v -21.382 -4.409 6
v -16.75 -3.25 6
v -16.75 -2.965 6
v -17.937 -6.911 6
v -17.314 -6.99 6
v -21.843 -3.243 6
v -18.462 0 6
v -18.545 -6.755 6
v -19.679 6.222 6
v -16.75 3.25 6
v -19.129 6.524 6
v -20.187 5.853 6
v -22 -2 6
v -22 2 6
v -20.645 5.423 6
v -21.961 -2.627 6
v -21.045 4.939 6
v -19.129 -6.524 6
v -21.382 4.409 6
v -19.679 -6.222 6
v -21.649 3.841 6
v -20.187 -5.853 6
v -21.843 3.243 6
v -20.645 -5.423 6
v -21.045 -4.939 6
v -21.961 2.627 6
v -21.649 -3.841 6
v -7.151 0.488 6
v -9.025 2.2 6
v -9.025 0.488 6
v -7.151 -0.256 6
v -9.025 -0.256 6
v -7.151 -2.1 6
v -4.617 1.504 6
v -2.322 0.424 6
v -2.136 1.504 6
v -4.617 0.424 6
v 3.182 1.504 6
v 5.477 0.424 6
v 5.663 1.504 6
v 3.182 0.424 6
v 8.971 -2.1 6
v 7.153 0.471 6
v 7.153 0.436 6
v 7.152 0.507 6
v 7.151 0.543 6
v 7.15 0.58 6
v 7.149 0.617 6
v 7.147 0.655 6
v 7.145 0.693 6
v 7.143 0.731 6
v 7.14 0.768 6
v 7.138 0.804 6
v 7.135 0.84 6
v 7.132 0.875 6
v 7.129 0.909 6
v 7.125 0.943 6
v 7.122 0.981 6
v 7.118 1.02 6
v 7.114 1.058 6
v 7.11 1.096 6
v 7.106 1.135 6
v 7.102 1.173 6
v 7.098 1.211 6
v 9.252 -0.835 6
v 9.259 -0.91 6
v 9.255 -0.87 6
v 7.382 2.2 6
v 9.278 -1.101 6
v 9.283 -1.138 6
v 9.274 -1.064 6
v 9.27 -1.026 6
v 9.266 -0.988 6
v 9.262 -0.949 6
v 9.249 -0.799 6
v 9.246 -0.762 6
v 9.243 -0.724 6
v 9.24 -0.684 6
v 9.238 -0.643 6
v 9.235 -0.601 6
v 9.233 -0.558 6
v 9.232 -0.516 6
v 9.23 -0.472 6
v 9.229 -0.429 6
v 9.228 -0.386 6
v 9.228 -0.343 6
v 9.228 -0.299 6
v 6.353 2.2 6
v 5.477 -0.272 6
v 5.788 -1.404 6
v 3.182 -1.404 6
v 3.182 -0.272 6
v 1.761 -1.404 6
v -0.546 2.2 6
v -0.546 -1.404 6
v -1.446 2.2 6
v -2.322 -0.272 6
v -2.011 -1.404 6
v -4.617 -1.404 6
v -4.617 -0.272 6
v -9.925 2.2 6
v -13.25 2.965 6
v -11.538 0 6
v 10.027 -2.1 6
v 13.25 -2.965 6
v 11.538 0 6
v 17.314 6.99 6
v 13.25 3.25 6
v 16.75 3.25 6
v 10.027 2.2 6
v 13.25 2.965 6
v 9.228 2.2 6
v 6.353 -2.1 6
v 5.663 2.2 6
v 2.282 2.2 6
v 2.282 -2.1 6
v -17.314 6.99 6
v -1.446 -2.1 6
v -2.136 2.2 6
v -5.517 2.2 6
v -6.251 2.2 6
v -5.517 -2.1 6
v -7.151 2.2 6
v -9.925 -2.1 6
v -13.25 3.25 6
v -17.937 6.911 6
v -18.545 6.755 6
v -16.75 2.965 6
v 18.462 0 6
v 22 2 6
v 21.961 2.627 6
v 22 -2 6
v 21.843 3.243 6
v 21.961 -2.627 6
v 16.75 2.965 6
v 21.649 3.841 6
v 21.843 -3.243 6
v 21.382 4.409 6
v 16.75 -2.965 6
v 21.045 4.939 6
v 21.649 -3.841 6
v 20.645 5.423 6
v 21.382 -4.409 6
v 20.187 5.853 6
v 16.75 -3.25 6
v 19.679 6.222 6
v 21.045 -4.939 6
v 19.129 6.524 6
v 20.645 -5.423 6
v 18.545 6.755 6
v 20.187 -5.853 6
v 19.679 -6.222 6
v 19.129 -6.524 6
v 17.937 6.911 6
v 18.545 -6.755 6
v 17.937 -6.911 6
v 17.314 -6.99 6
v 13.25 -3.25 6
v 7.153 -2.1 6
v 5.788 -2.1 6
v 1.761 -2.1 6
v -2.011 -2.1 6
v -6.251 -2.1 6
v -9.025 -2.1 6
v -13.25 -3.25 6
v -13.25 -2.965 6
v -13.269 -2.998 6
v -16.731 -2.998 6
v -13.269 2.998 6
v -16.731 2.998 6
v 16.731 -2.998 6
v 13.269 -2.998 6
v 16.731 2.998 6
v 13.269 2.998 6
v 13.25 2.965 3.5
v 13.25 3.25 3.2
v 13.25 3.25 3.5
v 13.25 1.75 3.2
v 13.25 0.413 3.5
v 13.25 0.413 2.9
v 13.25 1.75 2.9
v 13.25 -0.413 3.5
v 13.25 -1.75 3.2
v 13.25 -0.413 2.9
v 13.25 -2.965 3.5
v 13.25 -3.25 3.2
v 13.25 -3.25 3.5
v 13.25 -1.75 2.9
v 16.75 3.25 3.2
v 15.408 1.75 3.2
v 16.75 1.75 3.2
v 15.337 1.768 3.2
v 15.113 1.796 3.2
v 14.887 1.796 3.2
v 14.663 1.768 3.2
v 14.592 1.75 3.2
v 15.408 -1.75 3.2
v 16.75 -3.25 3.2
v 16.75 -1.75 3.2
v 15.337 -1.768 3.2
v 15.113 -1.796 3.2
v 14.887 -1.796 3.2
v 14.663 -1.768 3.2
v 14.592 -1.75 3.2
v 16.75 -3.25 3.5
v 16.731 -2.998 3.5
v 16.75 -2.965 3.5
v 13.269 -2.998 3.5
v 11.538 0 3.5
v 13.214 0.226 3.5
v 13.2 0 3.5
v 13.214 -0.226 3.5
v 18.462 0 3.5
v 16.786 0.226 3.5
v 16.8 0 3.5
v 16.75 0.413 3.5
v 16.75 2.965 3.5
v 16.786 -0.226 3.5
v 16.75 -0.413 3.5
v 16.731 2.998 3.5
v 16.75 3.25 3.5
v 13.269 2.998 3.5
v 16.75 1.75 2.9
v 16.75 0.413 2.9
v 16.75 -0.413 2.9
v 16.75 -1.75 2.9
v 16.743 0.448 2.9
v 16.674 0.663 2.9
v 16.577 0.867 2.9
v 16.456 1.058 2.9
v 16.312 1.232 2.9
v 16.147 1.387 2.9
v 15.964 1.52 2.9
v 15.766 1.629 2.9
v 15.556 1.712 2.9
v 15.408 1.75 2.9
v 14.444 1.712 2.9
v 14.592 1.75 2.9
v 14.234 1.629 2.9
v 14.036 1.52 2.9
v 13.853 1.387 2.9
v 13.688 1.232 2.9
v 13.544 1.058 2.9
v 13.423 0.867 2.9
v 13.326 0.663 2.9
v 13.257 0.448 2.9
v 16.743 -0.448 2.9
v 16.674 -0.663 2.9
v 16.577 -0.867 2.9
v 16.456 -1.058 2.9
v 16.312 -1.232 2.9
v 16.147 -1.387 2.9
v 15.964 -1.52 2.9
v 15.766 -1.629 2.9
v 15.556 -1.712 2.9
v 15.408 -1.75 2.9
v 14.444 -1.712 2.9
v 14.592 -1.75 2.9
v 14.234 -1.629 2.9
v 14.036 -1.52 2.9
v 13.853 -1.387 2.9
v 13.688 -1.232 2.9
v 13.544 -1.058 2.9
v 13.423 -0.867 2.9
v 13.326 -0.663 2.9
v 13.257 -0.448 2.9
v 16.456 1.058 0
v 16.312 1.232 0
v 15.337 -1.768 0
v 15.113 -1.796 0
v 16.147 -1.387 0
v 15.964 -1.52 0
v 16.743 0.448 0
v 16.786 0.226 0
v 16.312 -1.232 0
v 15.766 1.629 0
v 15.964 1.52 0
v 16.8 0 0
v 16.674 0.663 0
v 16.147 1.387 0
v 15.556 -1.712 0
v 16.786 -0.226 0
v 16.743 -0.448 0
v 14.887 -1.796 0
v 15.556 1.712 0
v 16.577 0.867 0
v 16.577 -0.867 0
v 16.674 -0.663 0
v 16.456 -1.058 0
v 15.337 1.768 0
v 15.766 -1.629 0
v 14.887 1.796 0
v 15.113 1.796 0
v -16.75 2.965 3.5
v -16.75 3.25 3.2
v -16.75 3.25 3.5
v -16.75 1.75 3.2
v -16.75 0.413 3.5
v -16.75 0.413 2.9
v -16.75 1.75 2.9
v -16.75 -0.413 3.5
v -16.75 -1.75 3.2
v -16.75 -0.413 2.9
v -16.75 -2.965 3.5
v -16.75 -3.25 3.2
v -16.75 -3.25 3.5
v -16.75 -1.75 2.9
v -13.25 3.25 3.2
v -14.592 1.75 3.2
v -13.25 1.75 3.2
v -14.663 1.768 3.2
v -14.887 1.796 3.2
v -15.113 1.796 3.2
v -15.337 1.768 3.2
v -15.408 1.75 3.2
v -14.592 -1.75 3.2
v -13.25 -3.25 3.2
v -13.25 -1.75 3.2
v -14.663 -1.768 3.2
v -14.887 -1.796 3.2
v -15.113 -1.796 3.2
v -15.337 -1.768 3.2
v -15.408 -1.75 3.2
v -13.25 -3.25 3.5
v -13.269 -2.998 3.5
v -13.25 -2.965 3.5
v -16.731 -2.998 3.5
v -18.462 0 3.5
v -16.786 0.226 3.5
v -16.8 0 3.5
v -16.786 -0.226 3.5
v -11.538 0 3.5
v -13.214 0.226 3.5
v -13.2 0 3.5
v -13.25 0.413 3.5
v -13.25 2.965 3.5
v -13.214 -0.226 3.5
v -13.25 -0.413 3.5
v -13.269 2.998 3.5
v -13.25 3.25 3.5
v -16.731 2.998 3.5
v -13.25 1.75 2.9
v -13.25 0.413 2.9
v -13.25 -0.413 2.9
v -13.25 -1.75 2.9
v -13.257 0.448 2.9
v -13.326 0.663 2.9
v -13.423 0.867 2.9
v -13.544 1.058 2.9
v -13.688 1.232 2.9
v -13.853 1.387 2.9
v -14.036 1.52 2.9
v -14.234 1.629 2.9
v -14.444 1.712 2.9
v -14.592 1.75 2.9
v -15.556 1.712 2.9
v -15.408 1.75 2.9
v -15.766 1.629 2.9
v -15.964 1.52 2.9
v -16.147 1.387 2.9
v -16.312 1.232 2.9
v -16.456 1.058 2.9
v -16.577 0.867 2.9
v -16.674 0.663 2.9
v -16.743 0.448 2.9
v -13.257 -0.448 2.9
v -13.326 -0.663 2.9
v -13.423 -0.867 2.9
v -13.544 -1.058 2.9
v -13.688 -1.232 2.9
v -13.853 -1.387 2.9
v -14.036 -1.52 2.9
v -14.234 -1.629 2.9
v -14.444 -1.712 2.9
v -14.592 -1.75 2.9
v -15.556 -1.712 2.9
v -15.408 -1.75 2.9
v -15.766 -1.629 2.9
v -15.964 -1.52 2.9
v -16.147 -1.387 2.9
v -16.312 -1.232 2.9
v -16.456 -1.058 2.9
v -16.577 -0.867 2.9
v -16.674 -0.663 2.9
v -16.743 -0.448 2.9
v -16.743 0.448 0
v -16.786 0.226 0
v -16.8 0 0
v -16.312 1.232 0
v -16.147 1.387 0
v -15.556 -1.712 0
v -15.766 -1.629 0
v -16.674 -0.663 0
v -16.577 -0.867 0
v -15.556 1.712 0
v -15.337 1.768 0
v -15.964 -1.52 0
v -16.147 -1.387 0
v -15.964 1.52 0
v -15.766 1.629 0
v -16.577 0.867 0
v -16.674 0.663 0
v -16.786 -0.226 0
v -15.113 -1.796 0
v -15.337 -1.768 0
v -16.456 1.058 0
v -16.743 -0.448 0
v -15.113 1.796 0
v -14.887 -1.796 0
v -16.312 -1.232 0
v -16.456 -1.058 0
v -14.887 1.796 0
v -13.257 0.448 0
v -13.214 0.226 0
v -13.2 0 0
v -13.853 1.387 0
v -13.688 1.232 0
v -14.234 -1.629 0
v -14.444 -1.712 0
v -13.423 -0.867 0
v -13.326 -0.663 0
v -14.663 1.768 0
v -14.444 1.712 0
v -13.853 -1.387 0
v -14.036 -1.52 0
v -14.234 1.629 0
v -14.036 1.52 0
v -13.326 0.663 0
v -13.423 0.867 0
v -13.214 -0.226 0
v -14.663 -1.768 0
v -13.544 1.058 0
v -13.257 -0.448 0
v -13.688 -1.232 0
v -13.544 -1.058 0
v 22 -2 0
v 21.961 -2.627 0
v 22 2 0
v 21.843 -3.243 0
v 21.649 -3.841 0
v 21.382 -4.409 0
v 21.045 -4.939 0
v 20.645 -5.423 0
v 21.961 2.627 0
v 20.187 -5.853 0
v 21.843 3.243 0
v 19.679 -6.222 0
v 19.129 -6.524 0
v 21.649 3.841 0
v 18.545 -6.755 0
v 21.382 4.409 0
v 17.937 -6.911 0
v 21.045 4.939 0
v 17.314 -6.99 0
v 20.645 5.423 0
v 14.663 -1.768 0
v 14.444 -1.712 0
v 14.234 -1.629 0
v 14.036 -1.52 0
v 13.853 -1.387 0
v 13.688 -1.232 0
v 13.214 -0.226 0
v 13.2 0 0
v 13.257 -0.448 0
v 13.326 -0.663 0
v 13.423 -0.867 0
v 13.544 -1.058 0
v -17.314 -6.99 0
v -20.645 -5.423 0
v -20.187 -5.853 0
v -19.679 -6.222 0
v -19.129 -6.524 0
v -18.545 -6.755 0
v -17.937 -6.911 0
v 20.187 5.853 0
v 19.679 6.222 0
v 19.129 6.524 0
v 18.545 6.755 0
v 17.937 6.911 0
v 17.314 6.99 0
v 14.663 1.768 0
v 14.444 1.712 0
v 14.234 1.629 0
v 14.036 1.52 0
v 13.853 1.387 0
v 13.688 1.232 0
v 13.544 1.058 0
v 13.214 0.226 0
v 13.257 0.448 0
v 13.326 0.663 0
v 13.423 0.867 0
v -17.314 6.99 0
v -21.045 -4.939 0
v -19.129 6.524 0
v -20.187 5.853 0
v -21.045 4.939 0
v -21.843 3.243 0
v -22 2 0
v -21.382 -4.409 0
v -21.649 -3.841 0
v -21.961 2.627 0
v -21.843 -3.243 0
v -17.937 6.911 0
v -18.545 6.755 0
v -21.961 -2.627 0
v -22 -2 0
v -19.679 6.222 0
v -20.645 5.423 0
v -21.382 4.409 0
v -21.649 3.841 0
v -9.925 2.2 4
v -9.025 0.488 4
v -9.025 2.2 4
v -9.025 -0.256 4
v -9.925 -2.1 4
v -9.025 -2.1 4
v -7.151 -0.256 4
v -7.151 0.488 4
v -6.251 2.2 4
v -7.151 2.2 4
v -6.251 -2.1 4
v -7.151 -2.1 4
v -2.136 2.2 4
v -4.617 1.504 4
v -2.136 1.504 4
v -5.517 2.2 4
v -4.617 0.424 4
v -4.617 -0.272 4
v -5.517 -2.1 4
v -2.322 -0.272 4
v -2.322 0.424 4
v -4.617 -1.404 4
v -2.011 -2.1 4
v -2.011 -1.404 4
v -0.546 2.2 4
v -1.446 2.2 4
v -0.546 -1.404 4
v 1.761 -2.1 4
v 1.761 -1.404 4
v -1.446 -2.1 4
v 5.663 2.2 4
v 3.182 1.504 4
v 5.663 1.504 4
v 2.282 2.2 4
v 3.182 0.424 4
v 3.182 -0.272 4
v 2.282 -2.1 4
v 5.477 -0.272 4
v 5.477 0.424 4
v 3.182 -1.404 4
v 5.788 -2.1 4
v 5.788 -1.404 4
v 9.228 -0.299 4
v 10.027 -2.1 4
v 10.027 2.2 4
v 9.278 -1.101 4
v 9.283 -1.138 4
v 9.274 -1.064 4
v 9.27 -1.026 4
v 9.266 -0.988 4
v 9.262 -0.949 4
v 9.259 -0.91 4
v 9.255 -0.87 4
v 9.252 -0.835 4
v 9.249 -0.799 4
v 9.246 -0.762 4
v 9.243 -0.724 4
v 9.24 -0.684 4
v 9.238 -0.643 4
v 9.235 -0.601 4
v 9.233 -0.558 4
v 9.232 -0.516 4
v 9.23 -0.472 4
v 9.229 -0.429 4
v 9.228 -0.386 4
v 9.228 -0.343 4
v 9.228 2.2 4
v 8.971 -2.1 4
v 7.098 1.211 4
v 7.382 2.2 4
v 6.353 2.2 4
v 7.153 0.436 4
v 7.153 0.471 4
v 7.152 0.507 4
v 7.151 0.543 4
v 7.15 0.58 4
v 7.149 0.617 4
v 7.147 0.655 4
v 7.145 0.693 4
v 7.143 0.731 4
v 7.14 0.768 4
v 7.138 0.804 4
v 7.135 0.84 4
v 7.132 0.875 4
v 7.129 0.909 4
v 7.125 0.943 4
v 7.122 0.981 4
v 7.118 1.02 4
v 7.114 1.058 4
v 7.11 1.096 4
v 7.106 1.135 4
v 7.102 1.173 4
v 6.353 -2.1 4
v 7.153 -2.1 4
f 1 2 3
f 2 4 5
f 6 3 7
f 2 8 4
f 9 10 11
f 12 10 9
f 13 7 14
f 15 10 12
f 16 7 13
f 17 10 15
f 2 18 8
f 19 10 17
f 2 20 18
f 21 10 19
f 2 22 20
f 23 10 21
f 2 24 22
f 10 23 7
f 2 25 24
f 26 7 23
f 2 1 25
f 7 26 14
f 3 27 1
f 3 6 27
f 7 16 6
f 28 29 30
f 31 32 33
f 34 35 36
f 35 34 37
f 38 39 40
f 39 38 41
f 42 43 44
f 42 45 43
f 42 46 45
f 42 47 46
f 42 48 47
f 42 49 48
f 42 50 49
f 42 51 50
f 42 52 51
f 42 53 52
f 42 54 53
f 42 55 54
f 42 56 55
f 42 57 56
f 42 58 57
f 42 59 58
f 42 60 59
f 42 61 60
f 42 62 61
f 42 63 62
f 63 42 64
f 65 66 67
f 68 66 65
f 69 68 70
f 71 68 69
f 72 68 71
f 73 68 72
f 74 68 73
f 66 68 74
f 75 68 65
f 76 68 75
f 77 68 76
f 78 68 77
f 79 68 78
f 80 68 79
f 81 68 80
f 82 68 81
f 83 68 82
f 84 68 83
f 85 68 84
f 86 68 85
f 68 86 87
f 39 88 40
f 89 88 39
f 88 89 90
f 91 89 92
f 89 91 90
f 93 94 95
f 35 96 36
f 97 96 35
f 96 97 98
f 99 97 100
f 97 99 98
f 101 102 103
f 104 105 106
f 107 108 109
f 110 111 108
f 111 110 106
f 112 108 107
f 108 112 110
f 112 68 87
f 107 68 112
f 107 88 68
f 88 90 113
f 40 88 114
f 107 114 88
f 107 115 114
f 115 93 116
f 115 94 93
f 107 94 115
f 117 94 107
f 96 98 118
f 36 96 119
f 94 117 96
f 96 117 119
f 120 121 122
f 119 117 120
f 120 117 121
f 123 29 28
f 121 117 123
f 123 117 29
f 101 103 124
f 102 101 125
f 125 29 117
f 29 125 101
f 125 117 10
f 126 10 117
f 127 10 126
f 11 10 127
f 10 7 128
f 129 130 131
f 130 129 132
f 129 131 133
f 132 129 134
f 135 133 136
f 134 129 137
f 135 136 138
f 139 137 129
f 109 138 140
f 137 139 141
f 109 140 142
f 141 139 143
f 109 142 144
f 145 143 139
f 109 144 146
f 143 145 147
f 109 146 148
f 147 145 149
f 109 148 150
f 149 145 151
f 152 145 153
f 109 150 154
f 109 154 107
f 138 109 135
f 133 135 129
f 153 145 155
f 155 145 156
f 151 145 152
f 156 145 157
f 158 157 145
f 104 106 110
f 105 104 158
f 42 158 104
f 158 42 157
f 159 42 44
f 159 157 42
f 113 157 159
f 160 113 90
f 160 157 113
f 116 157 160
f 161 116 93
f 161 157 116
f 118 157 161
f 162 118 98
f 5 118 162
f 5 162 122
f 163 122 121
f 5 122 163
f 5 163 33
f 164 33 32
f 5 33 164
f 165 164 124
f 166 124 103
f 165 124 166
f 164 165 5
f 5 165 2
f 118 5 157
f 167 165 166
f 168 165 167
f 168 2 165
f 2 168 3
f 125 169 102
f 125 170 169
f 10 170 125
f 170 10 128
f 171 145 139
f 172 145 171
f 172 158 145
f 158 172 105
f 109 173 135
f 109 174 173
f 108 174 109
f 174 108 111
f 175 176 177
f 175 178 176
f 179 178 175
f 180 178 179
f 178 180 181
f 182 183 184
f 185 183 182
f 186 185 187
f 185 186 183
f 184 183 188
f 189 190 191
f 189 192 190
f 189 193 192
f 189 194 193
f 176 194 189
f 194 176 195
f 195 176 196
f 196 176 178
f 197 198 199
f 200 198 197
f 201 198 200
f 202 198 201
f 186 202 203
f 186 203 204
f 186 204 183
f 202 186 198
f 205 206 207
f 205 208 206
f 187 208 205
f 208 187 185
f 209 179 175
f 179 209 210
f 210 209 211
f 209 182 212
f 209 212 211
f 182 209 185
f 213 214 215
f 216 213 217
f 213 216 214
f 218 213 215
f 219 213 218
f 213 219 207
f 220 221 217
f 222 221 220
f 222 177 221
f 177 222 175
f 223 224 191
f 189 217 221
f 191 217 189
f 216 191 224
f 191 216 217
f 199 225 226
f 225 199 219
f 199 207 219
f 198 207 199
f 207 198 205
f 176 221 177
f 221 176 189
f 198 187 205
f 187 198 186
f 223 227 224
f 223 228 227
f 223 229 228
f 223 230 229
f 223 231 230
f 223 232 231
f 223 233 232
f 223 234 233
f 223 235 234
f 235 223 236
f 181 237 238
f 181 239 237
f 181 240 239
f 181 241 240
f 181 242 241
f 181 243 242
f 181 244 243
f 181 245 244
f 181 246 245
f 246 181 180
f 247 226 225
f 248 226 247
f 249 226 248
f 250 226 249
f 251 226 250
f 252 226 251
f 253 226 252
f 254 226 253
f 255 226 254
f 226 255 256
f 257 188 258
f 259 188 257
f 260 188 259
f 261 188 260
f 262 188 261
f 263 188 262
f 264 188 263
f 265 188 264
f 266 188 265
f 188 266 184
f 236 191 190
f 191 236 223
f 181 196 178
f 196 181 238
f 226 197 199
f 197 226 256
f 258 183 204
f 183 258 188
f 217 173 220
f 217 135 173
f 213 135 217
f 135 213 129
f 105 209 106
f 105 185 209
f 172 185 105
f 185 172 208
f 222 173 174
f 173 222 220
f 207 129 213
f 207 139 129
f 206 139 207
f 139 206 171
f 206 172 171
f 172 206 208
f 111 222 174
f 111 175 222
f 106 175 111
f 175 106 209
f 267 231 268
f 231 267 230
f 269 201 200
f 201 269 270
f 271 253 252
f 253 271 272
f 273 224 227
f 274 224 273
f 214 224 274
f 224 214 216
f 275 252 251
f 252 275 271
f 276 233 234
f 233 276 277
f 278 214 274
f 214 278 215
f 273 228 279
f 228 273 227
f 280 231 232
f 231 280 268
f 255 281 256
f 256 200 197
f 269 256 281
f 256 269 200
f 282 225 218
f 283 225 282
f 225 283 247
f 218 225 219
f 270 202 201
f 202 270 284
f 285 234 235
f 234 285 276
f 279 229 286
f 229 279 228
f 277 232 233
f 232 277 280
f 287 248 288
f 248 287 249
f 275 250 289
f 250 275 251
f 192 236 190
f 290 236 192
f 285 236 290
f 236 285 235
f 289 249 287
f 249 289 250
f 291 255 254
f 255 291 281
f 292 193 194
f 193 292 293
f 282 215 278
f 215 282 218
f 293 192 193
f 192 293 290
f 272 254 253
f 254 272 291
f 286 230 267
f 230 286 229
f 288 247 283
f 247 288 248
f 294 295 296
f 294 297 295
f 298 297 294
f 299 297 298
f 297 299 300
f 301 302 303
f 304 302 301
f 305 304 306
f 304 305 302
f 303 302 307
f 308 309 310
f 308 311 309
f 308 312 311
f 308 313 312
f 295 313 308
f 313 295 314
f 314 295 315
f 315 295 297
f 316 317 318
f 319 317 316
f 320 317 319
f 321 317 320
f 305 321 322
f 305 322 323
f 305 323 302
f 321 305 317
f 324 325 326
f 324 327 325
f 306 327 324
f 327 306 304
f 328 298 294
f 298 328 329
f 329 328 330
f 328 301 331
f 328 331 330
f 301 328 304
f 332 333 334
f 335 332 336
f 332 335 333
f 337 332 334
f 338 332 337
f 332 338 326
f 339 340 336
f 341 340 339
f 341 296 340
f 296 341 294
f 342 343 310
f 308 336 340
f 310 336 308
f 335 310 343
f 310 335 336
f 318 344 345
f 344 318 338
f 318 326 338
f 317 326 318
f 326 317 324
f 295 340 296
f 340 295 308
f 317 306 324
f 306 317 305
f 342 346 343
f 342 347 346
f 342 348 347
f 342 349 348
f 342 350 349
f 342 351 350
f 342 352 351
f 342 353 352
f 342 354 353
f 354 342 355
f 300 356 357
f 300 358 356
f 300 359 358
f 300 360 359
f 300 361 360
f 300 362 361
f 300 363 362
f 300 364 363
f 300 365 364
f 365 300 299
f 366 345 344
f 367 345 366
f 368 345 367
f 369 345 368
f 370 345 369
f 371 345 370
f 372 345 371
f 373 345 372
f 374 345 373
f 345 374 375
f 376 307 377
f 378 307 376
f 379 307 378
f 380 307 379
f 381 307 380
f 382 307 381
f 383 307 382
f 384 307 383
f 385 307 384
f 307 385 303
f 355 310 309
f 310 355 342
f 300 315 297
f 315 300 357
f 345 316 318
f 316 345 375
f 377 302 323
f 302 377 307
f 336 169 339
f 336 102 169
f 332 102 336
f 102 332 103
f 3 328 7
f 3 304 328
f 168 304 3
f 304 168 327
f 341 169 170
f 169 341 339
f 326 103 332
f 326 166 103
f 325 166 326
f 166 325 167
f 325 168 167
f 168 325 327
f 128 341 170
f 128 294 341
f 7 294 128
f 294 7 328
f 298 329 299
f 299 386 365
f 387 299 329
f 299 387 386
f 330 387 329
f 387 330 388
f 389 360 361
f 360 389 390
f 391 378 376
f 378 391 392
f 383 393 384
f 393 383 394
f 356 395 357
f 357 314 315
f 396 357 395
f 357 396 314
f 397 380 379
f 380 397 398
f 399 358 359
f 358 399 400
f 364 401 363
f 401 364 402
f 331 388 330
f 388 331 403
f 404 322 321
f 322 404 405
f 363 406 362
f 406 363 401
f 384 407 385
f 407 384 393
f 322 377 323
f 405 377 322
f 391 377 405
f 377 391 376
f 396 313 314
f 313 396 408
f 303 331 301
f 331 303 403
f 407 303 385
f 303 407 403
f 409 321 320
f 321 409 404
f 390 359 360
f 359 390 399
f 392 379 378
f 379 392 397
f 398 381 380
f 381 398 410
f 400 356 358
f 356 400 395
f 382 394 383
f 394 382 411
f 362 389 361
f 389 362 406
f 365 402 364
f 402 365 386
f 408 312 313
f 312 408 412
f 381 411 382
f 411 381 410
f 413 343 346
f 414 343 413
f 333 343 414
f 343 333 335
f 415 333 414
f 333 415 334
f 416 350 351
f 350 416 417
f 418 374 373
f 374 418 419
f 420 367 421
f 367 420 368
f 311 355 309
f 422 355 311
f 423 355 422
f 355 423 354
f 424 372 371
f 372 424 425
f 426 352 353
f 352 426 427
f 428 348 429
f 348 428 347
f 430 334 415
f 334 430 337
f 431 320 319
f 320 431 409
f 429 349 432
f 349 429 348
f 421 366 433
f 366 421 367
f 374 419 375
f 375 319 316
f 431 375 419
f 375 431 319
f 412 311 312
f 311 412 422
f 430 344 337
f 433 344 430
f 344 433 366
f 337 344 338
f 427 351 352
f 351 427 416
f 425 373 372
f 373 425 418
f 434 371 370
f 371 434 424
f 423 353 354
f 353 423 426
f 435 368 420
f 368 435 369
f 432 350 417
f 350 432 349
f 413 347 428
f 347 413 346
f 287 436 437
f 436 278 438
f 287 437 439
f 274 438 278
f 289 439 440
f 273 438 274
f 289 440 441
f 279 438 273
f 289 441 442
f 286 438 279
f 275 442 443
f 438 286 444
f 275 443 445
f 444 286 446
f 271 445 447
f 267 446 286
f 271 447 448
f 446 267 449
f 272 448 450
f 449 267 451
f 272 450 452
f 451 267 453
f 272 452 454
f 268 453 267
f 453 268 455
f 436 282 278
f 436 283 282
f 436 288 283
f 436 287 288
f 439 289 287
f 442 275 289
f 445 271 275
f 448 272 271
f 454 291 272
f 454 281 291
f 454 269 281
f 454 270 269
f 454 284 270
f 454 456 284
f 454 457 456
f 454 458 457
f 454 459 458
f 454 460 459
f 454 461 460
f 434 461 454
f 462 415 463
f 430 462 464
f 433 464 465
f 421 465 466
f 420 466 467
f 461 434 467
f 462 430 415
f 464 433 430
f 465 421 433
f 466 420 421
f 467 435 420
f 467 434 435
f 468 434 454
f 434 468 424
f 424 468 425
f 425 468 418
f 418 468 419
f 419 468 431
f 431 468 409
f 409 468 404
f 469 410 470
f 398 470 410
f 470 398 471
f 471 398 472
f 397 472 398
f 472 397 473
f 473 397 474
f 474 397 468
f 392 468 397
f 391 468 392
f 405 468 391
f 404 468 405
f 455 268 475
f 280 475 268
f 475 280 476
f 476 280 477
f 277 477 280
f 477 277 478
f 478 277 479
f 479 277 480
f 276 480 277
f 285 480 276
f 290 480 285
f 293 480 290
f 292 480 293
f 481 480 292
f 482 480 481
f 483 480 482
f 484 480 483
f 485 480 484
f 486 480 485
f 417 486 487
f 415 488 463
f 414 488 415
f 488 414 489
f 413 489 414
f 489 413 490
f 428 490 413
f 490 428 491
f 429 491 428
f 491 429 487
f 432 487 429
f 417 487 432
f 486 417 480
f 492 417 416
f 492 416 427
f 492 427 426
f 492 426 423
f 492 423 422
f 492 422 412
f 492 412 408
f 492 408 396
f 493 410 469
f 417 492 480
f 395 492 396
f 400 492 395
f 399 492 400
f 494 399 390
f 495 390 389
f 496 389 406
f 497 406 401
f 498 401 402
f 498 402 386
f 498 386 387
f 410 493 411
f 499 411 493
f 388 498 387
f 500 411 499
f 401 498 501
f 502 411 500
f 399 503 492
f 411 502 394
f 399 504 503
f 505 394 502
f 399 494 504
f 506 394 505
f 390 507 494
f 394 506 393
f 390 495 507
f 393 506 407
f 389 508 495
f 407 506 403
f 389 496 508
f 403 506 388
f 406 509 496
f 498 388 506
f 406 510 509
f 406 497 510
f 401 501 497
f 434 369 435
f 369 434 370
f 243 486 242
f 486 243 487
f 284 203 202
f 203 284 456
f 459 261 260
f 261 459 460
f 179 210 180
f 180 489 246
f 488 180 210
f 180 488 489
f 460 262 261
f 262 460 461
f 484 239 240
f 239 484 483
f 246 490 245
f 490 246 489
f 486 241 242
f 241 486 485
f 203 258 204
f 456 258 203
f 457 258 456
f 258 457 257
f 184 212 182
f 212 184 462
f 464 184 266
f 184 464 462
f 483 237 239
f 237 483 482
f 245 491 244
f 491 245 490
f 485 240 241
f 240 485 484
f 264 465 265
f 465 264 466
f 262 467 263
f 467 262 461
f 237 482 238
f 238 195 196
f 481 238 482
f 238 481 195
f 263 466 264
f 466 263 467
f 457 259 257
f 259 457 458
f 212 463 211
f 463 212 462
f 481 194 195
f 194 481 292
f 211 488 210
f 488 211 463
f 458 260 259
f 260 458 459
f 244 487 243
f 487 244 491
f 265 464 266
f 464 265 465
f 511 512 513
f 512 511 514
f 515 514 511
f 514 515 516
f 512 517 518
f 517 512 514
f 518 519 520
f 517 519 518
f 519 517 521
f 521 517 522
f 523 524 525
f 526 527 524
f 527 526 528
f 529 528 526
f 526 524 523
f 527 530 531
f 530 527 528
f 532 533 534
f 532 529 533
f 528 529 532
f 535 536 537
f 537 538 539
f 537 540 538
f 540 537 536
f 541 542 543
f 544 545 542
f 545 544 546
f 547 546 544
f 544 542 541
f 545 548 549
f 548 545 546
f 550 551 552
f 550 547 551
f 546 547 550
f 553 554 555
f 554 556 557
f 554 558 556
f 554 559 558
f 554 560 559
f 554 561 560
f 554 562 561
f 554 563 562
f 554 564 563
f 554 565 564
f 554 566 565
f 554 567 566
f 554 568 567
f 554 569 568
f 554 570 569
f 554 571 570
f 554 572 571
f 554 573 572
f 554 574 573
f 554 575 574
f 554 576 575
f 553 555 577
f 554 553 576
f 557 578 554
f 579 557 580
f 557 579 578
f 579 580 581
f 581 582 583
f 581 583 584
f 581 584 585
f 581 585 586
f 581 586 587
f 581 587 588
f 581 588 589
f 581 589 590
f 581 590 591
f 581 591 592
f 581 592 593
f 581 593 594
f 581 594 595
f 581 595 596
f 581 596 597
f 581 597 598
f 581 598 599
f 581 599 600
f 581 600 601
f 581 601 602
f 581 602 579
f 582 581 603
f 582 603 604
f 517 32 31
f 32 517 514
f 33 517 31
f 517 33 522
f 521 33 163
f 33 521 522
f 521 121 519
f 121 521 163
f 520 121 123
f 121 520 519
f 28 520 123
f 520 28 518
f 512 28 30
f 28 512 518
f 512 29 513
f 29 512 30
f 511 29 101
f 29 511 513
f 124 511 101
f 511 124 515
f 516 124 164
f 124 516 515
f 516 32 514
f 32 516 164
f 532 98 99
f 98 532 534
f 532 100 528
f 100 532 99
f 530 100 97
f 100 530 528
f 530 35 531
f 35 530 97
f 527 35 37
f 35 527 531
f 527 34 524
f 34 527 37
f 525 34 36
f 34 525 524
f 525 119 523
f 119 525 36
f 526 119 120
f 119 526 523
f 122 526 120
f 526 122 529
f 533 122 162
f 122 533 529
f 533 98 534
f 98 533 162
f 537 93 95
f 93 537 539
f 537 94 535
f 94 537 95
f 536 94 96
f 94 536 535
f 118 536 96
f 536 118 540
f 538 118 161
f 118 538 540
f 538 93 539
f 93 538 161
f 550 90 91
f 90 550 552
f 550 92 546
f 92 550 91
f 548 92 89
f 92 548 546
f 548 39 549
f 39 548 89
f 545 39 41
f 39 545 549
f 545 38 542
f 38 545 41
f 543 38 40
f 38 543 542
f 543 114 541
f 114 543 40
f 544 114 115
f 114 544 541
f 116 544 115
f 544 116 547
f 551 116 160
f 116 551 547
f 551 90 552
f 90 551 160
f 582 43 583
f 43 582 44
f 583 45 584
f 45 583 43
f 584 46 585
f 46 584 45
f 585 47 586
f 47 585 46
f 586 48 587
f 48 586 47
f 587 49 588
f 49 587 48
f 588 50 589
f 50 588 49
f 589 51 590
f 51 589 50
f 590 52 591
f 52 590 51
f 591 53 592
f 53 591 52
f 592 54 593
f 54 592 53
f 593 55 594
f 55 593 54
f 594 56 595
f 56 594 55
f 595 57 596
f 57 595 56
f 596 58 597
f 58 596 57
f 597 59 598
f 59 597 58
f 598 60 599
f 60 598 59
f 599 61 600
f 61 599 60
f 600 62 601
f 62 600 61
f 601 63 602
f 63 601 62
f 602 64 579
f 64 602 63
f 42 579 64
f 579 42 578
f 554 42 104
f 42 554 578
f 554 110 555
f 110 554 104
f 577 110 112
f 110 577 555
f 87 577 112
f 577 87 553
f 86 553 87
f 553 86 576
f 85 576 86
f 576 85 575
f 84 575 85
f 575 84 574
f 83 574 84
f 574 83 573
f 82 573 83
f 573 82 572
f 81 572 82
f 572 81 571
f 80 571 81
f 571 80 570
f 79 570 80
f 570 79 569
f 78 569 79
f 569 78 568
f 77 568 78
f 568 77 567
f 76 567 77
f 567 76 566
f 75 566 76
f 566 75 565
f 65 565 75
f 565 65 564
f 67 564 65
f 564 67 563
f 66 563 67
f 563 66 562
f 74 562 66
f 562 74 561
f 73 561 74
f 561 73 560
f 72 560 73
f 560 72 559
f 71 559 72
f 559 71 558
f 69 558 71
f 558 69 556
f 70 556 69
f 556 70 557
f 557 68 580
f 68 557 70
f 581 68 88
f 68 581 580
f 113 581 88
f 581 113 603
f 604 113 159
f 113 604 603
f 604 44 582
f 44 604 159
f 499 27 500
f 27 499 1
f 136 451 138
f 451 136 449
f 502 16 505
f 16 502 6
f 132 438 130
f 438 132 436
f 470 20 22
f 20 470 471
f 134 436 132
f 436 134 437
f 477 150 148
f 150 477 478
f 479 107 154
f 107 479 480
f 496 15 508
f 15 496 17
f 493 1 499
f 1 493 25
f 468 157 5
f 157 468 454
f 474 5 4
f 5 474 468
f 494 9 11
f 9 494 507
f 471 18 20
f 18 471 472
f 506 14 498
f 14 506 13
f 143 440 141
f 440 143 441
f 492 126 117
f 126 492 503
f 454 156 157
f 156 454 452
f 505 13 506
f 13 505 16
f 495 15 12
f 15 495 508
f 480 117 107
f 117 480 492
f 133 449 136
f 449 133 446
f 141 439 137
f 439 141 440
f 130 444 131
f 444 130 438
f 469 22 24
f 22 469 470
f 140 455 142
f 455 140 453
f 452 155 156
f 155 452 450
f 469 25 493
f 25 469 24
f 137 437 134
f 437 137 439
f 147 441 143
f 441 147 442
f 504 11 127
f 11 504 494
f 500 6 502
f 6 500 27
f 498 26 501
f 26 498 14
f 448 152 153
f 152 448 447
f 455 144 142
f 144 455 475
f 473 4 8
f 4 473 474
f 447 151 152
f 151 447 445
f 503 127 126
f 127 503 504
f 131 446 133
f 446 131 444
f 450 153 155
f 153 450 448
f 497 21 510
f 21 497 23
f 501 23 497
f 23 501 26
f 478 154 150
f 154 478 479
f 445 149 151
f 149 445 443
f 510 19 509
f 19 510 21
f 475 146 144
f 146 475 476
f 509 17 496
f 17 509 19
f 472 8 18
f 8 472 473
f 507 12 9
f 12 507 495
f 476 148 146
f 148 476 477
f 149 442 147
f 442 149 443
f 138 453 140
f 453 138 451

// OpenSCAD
$fn = 50;


difference() {
	union() {
		hull() {
			translate(v = [-17.0000000000, 2.0000000000, 0]) {
				cylinder(h = 6, r = 5);
			}
			translate(v = [17.0000000000, 2.0000000000, 0]) {
				cylinder(h = 6, r = 5);
			}
			translate(v = [-17.0000000000, -2.0000000000, 0]) {
				cylinder(h = 6, r = 5);
			}
			translate(v = [17.0000000000, -2.0000000000, 0]) {
				cylinder(h = 6, r = 5);
			}
		}
	}
	union() {
		translate(v = [15.0000000000, 0, -20]) {
			rotate(a = [0, 180, 0]) {
				difference() {
					union() {
						translate(v = [0, 0, -26.0000000000]) {
							rotate(a = [0, 0, 0]) {
								difference() {
									union() {
										#translate(v = [-1.7500000000, -3.2500000000, -0.3000000000]) {
											cube(size = [3.5000000000, 6.5000000000, 0.3000000000]);
										}
										#translate(v = [-1.7500000000, -1.7500000000, -0.6000000000]) {
											cube(size = [3.5000000000, 3.5000000000, 0.3000000000]);
										}
										#translate(v = [-1.7500000000, -3.2500000000, 2.5000000000]) {
											cube(size = [3.5000000000, 6.5000000000, 0.3000000000]);
										}
										#translate(v = [-1.7500000000, -1.7500000000, 2.8000000000]) {
											cube(size = [3.5000000000, 3.5000000000, 0.3000000000]);
										}
										#linear_extrude(height = 2.5000000000) {
											polygon(points = [[3.4620000000, 0.0000000000], [1.7310000000, 2.9981799479], [-1.7310000000, 2.9981799479], [-3.4620000000, 0.0000000000], [-1.7310000000, -2.9981799479], [1.7310000000, -2.9981799479]]);
										}
										#translate(v = [-1.7500000000, -3.2500000000, -0.3000000000]) {
											cube(size = [3.5000000000, 6.5000000000, 0.3000000000]);
										}
										#translate(v = [-1.7500000000, -1.7500000000, -0.6000000000]) {
											cube(size = [3.5000000000, 3.5000000000, 0.3000000000]);
										}
										#translate(v = [-1.7500000000, -3.2500000000, 2.5000000000]) {
											cube(size = [3.5000000000, 6.5000000000, 0.3000000000]);
										}
										#translate(v = [-1.7500000000, -1.7500000000, 2.8000000000]) {
											cube(size = [3.5000000000, 3.5000000000, 0.3000000000]);
										}
										#translate(v = [-1.7500000000, -3.2500000000, -0.3000000000]) {
											cube(size = [3.5000000000, 6.5000000000, 0.3000000000]);
										}
										#translate(v = [-1.7500000000, -1.7500000000, -0.6000000000]) {
											cube(size = [3.5000000000, 3.5000000000, 0.3000000000]);
										}
										#translate(v = [-1.7500000000, -3.2500000000, 2.5000000000]) {
											cube(size = [3.5000000000, 6.5000000000, 0.3000000000]);
										}
										#translate(v = [-1.7500000000, -1.7500000000, 2.8000000000]) {
											cube(size = [3.5000000000, 3.5000000000, 0.3000000000]);
										}
									}
									union();
								}
							}
						}
						translate(v = [0, 0, -26.0000000000]) {
							rotate(a = [0, 0, 0]) {
								difference() {
									union() {
										#translate(v = [-1.7500000000, -3.2500000000, -0.3000000000]) {
											cube(size = [3.5000000000, 6.5000000000, 0.3000000000]);
										}
										#translate(v = [-1.7500000000, -1.7500000000, -0.6000000000]) {
											cube(size = [3.5000000000, 3.5000000000, 0.3000000000]);
										}
										#translate(v = [-1.7500000000, -3.2500000000, 2.5000000000]) {
											cube(size = [3.5000000000, 6.5000000000, 0.3000000000]);
										}
										#translate(v = [-1.7500000000, -1.7500000000, 2.8000000000]) {
											cube(size = [3.5000000000, 3.5000000000, 0.3000000000]);
										}
										#linear_extrude(height = 2.5000000000) {
											polygon(points = [[3.4620000000, 0.0000000000], [1.7310000000, 2.9981799479], [-1.7310000000, 2.9981799479], [-3.4620000000, 0.0000000000], [-1.7310000000, -2.9981799479], [1.7310000000, -2.9981799479]]);
										}
										#translate(v = [-1.7500000000, -3.2500000000, -0.3000000000]) {
											cube(size = [3.5000000000, 6.5000000000, 0.3000000000]);
										}
										#translate(v = [-1.7500000000, -1.7500000000, -0.6000000000]) {
											cube(size = [3.5000000000, 3.5000000000, 0.3000000000]);
										}
										#translate(v = [-1.7500000000, -3.2500000000, 2.5000000000]) {
											cube(size = [3.5000000000, 6.5000000000, 0.3000000000]);
										}
										#translate(v = [-1.7500000000, -1.7500000000, 2.8000000000]) {
											cube(size = [3.5000000000, 3.5000000000, 0.3000000000]);
										}
										#translate(v = [-1.7500000000, -3.2500000000, -0.3000000000]) {
											cube(size = [3.5000000000, 6.5000000000, 0.3000000000]);
										}
										#translate(v = [-1.7500000000, -1.7500000000, -0.6000000000]) {
											cube(size = [3.5000000000, 3.5000000000, 0.3000000000]);
										}
										#translate(v = [-1.7500000000, -3.2500000000, 2.5000000000]) {
											cube(size = [3.5000000000, 6.5000000000, 0.3000000000]);
										}
										#translate(v = [-1.7500000000, -1.7500000000, 2.8000000000]) {
											cube(size = [3.5000000000, 3.5000000000, 0.3000000000]);
										}
									}
									union();
								}
							}
						}
						translate(v = [0, 0, -26.0000000000]) {
							rotate(a = [0, 0, 0]) {
								difference() {
									union() {
										#translate(v = [-1.7500000000, -3.2500000000, -0.3000000000]) {
											cube(size = [3.5000000000, 6.5000000000, 0.3000000000]);
										}
										#translate(v = [-1.7500000000, -1.7500000000, -0.6000000000]) {
											cube(size = [3.5000000000, 3.5000000000, 0.3000000000]);
										}
										#translate(v = [-1.7500000000, -3.2500000000, 2.5000000000]) {
											cube(size = [3.5000000000, 6.5000000000, 0.3000000000]);
										}
										#translate(v = [-1.7500000000, -1.7500000000, 2.8000000000]) {
											cube(size = [3.5000000000, 3.5000000000, 0.3000000000]);
										}
										#linear_extrude(height = 2.5000000000) {
											polygon(points = [[3.4620000000, 0.0000000000], [1.7310000000, 2.9981799479], [-1.7310000000, 2.9981799479], [-3.4620000000, 0.0000000000], [-1.7310000000, -2.9981799479], [1.7310000000, -2.9981799479]]);
										}
										#translate(v = [-1.7500000000, -3.2500000000, -0.3000000000]) {
											cube(size = [3.5000000000, 6.5000000000, 0.3000000000]);
										}
										#translate(v = [-1.7500000000, -1.7500000000, -0.6000000000]) {
											cube(size = [3.5000000000, 3.5000000000, 0.3000000000]);
										}
										#translate(v = [-1.7500000000, -3.2500000000, 2.5000000000]) {
											cube(size = [3.5000000000, 6.5000000000, 0.3000000000]);
										}
										#translate(v = [-1.7500000000, -1.7500000000, 2.8000000000]) {
											cube(size = [3.5000000000, 3.5000000000, 0.3000000000]);
										}
										#translate(v = [-1.7500000000, -3.2500000000, -0.3000000000]) {
											cube(size = [3.5000000000, 6.5000000000, 0.3000000000]);
										}
										#translate(v = [-1.7500000000, -1.7500000000, -0.6000000000]) {
											cube(size = [3.5000000000, 3.5000000000, 0.3000000000]);
										}
										#translate(v = [-1.7500000000, -3.2500000000, 2.5000000000]) {
											cube(size = [3.5000000000, 6.5000000000, 0.3000000000]);
										}
										#translate(v = [-1.7500000000, -1.7500000000, 2.8000000000]) {
											cube(size = [3.5000000000, 3.5000000000, 0.3000000000]);
										}
									}
									union();
								}
							}
						}
						#translate(v = [0, 0, -26.0000000000]) {
							cylinder(h = 26, r = 1.5000000000);
						}
						#translate(v = [0, 0, -1.9000000000]) {
							cylinder(h = 1.9000000000, r1 = 1.8000000000, r2 = 3.6000000000);
						}
						#translate(v = [0, 0, -26.0000000000]) {
							cylinder(h = 26, r = 1.8000000000);
						}
						#translate(v = [0, 0, -26.0000000000]) {
							cylinder(h = 26, r = 1.5000000000);
						}
					}
					union();
				}
			}
		}
		translate(v = [-15.0000000000, 0, -20]) {
			rotate(a = [0, 180, 0]) {
				difference() {
					union() {
						translate(v = [0, 0, -26.0000000000]) {
							rotate(a = [0, 0, 0]) {
								difference() {
									union() {
										#translate(v = [-1.7500000000, -3.2500000000, -0.3000000000]) {
											cube(size = [3.5000000000, 6.5000000000, 0.3000000000]);
										}
										#translate(v = [-1.7500000000, -1.7500000000, -0.6000000000]) {
											cube(size = [3.5000000000, 3.5000000000, 0.3000000000]);
										}
										#translate(v = [-1.7500000000, -3.2500000000, 2.5000000000]) {
											cube(size = [3.5000000000, 6.5000000000, 0.3000000000]);
										}
										#translate(v = [-1.7500000000, -1.7500000000, 2.8000000000]) {
											cube(size = [3.5000000000, 3.5000000000, 0.3000000000]);
										}
										#linear_extrude(height = 2.5000000000) {
											polygon(points = [[3.4620000000, 0.0000000000], [1.7310000000, 2.9981799479], [-1.7310000000, 2.9981799479], [-3.4620000000, 0.0000000000], [-1.7310000000, -2.9981799479], [1.7310000000, -2.9981799479]]);
										}
										#translate(v = [-1.7500000000, -3.2500000000, -0.3000000000]) {
											cube(size = [3.5000000000, 6.5000000000, 0.3000000000]);
										}
										#translate(v = [-1.7500000000, -1.7500000000, -0.6000000000]) {
											cube(size = [3.5000000000, 3.5000000000, 0.3000000000]);
										}
										#translate(v = [-1.7500000000, -3.2500000000, 2.5000000000]) {
											cube(size = [3.5000000000, 6.5000000000, 0.3000000000]);
										}
										#translate(v = [-1.7500000000, -1.7500000000, 2.8000000000]) {
											cube(size = [3.5000000000, 3.5000000000, 0.3000000000]);
										}
										#translate(v = [-1.7500000000, -3.2500000000, -0.3000000000]) {
											cube(size = [3.5000000000, 6.5000000000, 0.3000000000]);
										}
										#translate(v = [-1.7500000000, -1.7500000000, -0.6000000000]) {
											cube(size = [3.5000000000, 3.5000000000, 0.3000000000]);
										}
										#translate(v = [-1.7500000000, -3.2500000000, 2.5000000000]) {
											cube(size = [3.5000000000, 6.5000000000, 0.3000000000]);
										}
										#translate(v = [-1.7500000000, -1.7500000000, 2.8000000000]) {
											cube(size = [3.5000000000, 3.5000000000, 0.3000000000]);
										}
									}
									union();
								}
							}
						}
						translate(v = [0, 0, -26.0000000000]) {
							rotate(a = [0, 0, 0]) {
								difference() {
									union() {
										#translate(v = [-1.7500000000, -3.2500000000, -0.3000000000]) {
											cube(size = [3.5000000000, 6.5000000000, 0.3000000000]);
										}
										#translate(v = [-1.7500000000, -1.7500000000, -0.6000000000]) {
											cube(size = [3.5000000000, 3.5000000000, 0.3000000000]);
										}
										#translate(v = [-1.7500000000, -3.2500000000, 2.5000000000]) {
											cube(size = [3.5000000000, 6.5000000000, 0.3000000000]);
										}
										#translate(v = [-1.7500000000, -1.7500000000, 2.8000000000]) {
											cube(size = [3.5000000000, 3.5000000000, 0.3000000000]);
										}
										#linear_extrude(height = 2.5000000000) {
											polygon(points = [[3.4620000000, 0.0000000000], [1.7310000000, 2.9981799479], [-1.7310000000, 2.9981799479], [-3.4620000000, 0.0000000000], [-1.7310000000, -2.9981799479], [1.7310000000, -2.9981799479]]);
										}
										#translate(v = [-1.7500000000, -3.2500000000, -0.3000000000]) {
											cube(size = [3.5000000000, 6.5000000000, 0.3000000000]);
										}
										#translate(v = [-1.7500000000, -1.7500000000, -0.6000000000]) {
											cube(size = [3.5000000000, 3.5000000000, 0.3000000000]);
										}
										#translate(v = [-1.7500000000, -3.2500000000, 2.5000000000]) {
											cube(size = [3.5000000000, 6.5000000000, 0.3000000000]);
										}
										#translate(v = [-1.7500000000, -1.7500000000, 2.8000000000]) {
											cube(size = [3.5000000000, 3.5000000000, 0.3000000000]);
										}
										#translate(v = [-1.7500000000, -3.2500000000, -0.3000000000]) {
											cube(size = [3.5000000000, 6.5000000000, 0.3000000000]);
										}
										#translate(v = [-1.7500000000, -1.7500000000, -0.6000000000]) {
											cube(size = [3.5000000000, 3.5000000000, 0.3000000000]);
										}
										#translate(v = [-1.7500000000, -3.2500000000, 2.5000000000]) {
											cube(size = [3.5000000000, 6.5000000000, 0.3000000000]);
										}
										#translate(v = [-1.7500000000, -1.7500000000, 2.8000000000]) {
											cube(size = [3.5000000000, 3.5000000000, 0.3000000000]);
										}
									}
									union();
								}
							}
						}
						translate(v = [0, 0, -26.0000000000]) {
							rotate(a = [0, 0, 0]) {
								difference() {
									union() {
										#translate(v = [-1.7500000000, -3.2500000000, -0.3000000000]) {
											cube(size = [3.5000000000, 6.5000000000, 0.3000000000]);
										}
										#translate(v = [-1.7500000000, -1.7500000000, -0.6000000000]) {
											cube(size = [3.5000000000, 3.5000000000, 0.3000000000]);
										}
										#translate(v = [-1.7500000000, -3.2500000000, 2.5000000000]) {
											cube(size = [3.5000000000, 6.5000000000, 0.3000000000]);
										}
										#translate(v = [-1.7500000000, -1.7500000000, 2.8000000000]) {
											cube(size = [3.5000000000, 3.5000000000, 0.3000000000]);
										}
										#linear_extrude(height = 2.5000000000) {
											polygon(points = [[3.4620000000, 0.0000000000], [1.7310000000, 2.9981799479], [-1.7310000000, 2.9981799479], [-3.4620000000, 0.0000000000], [-1.7310000000, -2.9981799479], [1.7310000000, -2.9981799479]]);
										}
										#translate(v = [-1.7500000000, -3.2500000000, -0.3000000000]) {
											cube(size = [3.5000000000, 6.5000000000, 0.3000000000]);
										}
										#translate(v = [-1.7500000000, -1.7500000000, -0.6000000000]) {
											cube(size = [3.5000000000, 3.5000000000, 0.3000000000]);
										}
										#translate(v = [-1.7500000000, -3.2500000000, 2.5000000000]) {
											cube(size = [3.5000000000, 6.5000000000, 0.3000000000]);
										}
										#translate(v = [-1.7500000000, -1.7500000000, 2.8000000000]) {
											cube(size = [3.5000000000, 3.5000000000, 0.3000000000]);
										}
										#translate(v = [-1.7500000000, -3.2500000000, -0.3000000000]) {
											cube(size = [3.5000000000, 6.5000000000, 0.3000000000]);
										}
										#translate(v = [-1.7500000000, -1.7500000000, -0.6000000000]) {
											cube(size = [3.5000000000, 3.5000000000, 0.3000000000]);
										}
										#translate(v = [-1.7500000000, -3.2500000000, 2.5000000000]) {
											cube(size = [3.5000000000, 6.5000000000, 0.3000000000]);
										}
										#translate(v = [-1.7500000000, -1.7500000000, 2.8000000000]) {
											cube(size = [3.5000000000, 3.5000000000, 0.3000000000]);
										}
									}
									union();
								}
							}
						}
						#translate(v = [0, 0, -26.0000000000]) {
							cylinder(h = 26, r = 1.5000000000);
						}
						#translate(v = [0, 0, -1.9000000000]) {
							cylinder(h = 1.9000000000, r1 = 1.8000000000, r2 = 3.6000000000);
						}
						#translate(v = [0, 0, -26.0000000000]) {
							cylinder(h = 26, r = 1.8000000000);
						}
						#translate(v = [0, 0, -26.0000000000]) {
							cylinder(h = 26, r = 1.5000000000);
						}
					}
					union();
				}
			}
		}
		translate(v = [-15.0000000000, 0.0000000000, 0]) {
			cylinder(h = 6, r = 1.8000000000);
		}
		translate(v = [15.0000000000, 0.0000000000, 0]) {
			cylinder(h = 6, r = 1.8000000000);
		}
		translate(v = [-15.0000000000, 0.0000000000, 0]) {
			cylinder(h = 6, r = 1.8000000000);
		}
		translate(v = [15.0000000000, 0.0000000000, 0]) {
			cylinder(h = 6, r = 1.8000000000);
		}
		translate(v = [-15.0000000000, 0.0000000000, 0]) {
			cylinder(h = 6, r = 1.8000000000);
		}
		translate(v = [15.0000000000, 0.0000000000, 0]) {
			cylinder(h = 6, r = 1.8000000000);
		}
		translate(v = [-15.0000000000, 0.0000000000, 0]) {
			cylinder(h = 6, r = 1.8000000000);
		}
		translate(v = [15.0000000000, 0.0000000000, 0]) {
			cylinder(h = 6, r = 1.8000000000);
		}
		#translate(v = [0, 0, 4]) {
			linear_extrude(height = 2) {
				text(font = "Arial:Bold", halign = "center", size = 4.5000000000, text = "HELEN", valign = "center");
			}
		}
	}
}
